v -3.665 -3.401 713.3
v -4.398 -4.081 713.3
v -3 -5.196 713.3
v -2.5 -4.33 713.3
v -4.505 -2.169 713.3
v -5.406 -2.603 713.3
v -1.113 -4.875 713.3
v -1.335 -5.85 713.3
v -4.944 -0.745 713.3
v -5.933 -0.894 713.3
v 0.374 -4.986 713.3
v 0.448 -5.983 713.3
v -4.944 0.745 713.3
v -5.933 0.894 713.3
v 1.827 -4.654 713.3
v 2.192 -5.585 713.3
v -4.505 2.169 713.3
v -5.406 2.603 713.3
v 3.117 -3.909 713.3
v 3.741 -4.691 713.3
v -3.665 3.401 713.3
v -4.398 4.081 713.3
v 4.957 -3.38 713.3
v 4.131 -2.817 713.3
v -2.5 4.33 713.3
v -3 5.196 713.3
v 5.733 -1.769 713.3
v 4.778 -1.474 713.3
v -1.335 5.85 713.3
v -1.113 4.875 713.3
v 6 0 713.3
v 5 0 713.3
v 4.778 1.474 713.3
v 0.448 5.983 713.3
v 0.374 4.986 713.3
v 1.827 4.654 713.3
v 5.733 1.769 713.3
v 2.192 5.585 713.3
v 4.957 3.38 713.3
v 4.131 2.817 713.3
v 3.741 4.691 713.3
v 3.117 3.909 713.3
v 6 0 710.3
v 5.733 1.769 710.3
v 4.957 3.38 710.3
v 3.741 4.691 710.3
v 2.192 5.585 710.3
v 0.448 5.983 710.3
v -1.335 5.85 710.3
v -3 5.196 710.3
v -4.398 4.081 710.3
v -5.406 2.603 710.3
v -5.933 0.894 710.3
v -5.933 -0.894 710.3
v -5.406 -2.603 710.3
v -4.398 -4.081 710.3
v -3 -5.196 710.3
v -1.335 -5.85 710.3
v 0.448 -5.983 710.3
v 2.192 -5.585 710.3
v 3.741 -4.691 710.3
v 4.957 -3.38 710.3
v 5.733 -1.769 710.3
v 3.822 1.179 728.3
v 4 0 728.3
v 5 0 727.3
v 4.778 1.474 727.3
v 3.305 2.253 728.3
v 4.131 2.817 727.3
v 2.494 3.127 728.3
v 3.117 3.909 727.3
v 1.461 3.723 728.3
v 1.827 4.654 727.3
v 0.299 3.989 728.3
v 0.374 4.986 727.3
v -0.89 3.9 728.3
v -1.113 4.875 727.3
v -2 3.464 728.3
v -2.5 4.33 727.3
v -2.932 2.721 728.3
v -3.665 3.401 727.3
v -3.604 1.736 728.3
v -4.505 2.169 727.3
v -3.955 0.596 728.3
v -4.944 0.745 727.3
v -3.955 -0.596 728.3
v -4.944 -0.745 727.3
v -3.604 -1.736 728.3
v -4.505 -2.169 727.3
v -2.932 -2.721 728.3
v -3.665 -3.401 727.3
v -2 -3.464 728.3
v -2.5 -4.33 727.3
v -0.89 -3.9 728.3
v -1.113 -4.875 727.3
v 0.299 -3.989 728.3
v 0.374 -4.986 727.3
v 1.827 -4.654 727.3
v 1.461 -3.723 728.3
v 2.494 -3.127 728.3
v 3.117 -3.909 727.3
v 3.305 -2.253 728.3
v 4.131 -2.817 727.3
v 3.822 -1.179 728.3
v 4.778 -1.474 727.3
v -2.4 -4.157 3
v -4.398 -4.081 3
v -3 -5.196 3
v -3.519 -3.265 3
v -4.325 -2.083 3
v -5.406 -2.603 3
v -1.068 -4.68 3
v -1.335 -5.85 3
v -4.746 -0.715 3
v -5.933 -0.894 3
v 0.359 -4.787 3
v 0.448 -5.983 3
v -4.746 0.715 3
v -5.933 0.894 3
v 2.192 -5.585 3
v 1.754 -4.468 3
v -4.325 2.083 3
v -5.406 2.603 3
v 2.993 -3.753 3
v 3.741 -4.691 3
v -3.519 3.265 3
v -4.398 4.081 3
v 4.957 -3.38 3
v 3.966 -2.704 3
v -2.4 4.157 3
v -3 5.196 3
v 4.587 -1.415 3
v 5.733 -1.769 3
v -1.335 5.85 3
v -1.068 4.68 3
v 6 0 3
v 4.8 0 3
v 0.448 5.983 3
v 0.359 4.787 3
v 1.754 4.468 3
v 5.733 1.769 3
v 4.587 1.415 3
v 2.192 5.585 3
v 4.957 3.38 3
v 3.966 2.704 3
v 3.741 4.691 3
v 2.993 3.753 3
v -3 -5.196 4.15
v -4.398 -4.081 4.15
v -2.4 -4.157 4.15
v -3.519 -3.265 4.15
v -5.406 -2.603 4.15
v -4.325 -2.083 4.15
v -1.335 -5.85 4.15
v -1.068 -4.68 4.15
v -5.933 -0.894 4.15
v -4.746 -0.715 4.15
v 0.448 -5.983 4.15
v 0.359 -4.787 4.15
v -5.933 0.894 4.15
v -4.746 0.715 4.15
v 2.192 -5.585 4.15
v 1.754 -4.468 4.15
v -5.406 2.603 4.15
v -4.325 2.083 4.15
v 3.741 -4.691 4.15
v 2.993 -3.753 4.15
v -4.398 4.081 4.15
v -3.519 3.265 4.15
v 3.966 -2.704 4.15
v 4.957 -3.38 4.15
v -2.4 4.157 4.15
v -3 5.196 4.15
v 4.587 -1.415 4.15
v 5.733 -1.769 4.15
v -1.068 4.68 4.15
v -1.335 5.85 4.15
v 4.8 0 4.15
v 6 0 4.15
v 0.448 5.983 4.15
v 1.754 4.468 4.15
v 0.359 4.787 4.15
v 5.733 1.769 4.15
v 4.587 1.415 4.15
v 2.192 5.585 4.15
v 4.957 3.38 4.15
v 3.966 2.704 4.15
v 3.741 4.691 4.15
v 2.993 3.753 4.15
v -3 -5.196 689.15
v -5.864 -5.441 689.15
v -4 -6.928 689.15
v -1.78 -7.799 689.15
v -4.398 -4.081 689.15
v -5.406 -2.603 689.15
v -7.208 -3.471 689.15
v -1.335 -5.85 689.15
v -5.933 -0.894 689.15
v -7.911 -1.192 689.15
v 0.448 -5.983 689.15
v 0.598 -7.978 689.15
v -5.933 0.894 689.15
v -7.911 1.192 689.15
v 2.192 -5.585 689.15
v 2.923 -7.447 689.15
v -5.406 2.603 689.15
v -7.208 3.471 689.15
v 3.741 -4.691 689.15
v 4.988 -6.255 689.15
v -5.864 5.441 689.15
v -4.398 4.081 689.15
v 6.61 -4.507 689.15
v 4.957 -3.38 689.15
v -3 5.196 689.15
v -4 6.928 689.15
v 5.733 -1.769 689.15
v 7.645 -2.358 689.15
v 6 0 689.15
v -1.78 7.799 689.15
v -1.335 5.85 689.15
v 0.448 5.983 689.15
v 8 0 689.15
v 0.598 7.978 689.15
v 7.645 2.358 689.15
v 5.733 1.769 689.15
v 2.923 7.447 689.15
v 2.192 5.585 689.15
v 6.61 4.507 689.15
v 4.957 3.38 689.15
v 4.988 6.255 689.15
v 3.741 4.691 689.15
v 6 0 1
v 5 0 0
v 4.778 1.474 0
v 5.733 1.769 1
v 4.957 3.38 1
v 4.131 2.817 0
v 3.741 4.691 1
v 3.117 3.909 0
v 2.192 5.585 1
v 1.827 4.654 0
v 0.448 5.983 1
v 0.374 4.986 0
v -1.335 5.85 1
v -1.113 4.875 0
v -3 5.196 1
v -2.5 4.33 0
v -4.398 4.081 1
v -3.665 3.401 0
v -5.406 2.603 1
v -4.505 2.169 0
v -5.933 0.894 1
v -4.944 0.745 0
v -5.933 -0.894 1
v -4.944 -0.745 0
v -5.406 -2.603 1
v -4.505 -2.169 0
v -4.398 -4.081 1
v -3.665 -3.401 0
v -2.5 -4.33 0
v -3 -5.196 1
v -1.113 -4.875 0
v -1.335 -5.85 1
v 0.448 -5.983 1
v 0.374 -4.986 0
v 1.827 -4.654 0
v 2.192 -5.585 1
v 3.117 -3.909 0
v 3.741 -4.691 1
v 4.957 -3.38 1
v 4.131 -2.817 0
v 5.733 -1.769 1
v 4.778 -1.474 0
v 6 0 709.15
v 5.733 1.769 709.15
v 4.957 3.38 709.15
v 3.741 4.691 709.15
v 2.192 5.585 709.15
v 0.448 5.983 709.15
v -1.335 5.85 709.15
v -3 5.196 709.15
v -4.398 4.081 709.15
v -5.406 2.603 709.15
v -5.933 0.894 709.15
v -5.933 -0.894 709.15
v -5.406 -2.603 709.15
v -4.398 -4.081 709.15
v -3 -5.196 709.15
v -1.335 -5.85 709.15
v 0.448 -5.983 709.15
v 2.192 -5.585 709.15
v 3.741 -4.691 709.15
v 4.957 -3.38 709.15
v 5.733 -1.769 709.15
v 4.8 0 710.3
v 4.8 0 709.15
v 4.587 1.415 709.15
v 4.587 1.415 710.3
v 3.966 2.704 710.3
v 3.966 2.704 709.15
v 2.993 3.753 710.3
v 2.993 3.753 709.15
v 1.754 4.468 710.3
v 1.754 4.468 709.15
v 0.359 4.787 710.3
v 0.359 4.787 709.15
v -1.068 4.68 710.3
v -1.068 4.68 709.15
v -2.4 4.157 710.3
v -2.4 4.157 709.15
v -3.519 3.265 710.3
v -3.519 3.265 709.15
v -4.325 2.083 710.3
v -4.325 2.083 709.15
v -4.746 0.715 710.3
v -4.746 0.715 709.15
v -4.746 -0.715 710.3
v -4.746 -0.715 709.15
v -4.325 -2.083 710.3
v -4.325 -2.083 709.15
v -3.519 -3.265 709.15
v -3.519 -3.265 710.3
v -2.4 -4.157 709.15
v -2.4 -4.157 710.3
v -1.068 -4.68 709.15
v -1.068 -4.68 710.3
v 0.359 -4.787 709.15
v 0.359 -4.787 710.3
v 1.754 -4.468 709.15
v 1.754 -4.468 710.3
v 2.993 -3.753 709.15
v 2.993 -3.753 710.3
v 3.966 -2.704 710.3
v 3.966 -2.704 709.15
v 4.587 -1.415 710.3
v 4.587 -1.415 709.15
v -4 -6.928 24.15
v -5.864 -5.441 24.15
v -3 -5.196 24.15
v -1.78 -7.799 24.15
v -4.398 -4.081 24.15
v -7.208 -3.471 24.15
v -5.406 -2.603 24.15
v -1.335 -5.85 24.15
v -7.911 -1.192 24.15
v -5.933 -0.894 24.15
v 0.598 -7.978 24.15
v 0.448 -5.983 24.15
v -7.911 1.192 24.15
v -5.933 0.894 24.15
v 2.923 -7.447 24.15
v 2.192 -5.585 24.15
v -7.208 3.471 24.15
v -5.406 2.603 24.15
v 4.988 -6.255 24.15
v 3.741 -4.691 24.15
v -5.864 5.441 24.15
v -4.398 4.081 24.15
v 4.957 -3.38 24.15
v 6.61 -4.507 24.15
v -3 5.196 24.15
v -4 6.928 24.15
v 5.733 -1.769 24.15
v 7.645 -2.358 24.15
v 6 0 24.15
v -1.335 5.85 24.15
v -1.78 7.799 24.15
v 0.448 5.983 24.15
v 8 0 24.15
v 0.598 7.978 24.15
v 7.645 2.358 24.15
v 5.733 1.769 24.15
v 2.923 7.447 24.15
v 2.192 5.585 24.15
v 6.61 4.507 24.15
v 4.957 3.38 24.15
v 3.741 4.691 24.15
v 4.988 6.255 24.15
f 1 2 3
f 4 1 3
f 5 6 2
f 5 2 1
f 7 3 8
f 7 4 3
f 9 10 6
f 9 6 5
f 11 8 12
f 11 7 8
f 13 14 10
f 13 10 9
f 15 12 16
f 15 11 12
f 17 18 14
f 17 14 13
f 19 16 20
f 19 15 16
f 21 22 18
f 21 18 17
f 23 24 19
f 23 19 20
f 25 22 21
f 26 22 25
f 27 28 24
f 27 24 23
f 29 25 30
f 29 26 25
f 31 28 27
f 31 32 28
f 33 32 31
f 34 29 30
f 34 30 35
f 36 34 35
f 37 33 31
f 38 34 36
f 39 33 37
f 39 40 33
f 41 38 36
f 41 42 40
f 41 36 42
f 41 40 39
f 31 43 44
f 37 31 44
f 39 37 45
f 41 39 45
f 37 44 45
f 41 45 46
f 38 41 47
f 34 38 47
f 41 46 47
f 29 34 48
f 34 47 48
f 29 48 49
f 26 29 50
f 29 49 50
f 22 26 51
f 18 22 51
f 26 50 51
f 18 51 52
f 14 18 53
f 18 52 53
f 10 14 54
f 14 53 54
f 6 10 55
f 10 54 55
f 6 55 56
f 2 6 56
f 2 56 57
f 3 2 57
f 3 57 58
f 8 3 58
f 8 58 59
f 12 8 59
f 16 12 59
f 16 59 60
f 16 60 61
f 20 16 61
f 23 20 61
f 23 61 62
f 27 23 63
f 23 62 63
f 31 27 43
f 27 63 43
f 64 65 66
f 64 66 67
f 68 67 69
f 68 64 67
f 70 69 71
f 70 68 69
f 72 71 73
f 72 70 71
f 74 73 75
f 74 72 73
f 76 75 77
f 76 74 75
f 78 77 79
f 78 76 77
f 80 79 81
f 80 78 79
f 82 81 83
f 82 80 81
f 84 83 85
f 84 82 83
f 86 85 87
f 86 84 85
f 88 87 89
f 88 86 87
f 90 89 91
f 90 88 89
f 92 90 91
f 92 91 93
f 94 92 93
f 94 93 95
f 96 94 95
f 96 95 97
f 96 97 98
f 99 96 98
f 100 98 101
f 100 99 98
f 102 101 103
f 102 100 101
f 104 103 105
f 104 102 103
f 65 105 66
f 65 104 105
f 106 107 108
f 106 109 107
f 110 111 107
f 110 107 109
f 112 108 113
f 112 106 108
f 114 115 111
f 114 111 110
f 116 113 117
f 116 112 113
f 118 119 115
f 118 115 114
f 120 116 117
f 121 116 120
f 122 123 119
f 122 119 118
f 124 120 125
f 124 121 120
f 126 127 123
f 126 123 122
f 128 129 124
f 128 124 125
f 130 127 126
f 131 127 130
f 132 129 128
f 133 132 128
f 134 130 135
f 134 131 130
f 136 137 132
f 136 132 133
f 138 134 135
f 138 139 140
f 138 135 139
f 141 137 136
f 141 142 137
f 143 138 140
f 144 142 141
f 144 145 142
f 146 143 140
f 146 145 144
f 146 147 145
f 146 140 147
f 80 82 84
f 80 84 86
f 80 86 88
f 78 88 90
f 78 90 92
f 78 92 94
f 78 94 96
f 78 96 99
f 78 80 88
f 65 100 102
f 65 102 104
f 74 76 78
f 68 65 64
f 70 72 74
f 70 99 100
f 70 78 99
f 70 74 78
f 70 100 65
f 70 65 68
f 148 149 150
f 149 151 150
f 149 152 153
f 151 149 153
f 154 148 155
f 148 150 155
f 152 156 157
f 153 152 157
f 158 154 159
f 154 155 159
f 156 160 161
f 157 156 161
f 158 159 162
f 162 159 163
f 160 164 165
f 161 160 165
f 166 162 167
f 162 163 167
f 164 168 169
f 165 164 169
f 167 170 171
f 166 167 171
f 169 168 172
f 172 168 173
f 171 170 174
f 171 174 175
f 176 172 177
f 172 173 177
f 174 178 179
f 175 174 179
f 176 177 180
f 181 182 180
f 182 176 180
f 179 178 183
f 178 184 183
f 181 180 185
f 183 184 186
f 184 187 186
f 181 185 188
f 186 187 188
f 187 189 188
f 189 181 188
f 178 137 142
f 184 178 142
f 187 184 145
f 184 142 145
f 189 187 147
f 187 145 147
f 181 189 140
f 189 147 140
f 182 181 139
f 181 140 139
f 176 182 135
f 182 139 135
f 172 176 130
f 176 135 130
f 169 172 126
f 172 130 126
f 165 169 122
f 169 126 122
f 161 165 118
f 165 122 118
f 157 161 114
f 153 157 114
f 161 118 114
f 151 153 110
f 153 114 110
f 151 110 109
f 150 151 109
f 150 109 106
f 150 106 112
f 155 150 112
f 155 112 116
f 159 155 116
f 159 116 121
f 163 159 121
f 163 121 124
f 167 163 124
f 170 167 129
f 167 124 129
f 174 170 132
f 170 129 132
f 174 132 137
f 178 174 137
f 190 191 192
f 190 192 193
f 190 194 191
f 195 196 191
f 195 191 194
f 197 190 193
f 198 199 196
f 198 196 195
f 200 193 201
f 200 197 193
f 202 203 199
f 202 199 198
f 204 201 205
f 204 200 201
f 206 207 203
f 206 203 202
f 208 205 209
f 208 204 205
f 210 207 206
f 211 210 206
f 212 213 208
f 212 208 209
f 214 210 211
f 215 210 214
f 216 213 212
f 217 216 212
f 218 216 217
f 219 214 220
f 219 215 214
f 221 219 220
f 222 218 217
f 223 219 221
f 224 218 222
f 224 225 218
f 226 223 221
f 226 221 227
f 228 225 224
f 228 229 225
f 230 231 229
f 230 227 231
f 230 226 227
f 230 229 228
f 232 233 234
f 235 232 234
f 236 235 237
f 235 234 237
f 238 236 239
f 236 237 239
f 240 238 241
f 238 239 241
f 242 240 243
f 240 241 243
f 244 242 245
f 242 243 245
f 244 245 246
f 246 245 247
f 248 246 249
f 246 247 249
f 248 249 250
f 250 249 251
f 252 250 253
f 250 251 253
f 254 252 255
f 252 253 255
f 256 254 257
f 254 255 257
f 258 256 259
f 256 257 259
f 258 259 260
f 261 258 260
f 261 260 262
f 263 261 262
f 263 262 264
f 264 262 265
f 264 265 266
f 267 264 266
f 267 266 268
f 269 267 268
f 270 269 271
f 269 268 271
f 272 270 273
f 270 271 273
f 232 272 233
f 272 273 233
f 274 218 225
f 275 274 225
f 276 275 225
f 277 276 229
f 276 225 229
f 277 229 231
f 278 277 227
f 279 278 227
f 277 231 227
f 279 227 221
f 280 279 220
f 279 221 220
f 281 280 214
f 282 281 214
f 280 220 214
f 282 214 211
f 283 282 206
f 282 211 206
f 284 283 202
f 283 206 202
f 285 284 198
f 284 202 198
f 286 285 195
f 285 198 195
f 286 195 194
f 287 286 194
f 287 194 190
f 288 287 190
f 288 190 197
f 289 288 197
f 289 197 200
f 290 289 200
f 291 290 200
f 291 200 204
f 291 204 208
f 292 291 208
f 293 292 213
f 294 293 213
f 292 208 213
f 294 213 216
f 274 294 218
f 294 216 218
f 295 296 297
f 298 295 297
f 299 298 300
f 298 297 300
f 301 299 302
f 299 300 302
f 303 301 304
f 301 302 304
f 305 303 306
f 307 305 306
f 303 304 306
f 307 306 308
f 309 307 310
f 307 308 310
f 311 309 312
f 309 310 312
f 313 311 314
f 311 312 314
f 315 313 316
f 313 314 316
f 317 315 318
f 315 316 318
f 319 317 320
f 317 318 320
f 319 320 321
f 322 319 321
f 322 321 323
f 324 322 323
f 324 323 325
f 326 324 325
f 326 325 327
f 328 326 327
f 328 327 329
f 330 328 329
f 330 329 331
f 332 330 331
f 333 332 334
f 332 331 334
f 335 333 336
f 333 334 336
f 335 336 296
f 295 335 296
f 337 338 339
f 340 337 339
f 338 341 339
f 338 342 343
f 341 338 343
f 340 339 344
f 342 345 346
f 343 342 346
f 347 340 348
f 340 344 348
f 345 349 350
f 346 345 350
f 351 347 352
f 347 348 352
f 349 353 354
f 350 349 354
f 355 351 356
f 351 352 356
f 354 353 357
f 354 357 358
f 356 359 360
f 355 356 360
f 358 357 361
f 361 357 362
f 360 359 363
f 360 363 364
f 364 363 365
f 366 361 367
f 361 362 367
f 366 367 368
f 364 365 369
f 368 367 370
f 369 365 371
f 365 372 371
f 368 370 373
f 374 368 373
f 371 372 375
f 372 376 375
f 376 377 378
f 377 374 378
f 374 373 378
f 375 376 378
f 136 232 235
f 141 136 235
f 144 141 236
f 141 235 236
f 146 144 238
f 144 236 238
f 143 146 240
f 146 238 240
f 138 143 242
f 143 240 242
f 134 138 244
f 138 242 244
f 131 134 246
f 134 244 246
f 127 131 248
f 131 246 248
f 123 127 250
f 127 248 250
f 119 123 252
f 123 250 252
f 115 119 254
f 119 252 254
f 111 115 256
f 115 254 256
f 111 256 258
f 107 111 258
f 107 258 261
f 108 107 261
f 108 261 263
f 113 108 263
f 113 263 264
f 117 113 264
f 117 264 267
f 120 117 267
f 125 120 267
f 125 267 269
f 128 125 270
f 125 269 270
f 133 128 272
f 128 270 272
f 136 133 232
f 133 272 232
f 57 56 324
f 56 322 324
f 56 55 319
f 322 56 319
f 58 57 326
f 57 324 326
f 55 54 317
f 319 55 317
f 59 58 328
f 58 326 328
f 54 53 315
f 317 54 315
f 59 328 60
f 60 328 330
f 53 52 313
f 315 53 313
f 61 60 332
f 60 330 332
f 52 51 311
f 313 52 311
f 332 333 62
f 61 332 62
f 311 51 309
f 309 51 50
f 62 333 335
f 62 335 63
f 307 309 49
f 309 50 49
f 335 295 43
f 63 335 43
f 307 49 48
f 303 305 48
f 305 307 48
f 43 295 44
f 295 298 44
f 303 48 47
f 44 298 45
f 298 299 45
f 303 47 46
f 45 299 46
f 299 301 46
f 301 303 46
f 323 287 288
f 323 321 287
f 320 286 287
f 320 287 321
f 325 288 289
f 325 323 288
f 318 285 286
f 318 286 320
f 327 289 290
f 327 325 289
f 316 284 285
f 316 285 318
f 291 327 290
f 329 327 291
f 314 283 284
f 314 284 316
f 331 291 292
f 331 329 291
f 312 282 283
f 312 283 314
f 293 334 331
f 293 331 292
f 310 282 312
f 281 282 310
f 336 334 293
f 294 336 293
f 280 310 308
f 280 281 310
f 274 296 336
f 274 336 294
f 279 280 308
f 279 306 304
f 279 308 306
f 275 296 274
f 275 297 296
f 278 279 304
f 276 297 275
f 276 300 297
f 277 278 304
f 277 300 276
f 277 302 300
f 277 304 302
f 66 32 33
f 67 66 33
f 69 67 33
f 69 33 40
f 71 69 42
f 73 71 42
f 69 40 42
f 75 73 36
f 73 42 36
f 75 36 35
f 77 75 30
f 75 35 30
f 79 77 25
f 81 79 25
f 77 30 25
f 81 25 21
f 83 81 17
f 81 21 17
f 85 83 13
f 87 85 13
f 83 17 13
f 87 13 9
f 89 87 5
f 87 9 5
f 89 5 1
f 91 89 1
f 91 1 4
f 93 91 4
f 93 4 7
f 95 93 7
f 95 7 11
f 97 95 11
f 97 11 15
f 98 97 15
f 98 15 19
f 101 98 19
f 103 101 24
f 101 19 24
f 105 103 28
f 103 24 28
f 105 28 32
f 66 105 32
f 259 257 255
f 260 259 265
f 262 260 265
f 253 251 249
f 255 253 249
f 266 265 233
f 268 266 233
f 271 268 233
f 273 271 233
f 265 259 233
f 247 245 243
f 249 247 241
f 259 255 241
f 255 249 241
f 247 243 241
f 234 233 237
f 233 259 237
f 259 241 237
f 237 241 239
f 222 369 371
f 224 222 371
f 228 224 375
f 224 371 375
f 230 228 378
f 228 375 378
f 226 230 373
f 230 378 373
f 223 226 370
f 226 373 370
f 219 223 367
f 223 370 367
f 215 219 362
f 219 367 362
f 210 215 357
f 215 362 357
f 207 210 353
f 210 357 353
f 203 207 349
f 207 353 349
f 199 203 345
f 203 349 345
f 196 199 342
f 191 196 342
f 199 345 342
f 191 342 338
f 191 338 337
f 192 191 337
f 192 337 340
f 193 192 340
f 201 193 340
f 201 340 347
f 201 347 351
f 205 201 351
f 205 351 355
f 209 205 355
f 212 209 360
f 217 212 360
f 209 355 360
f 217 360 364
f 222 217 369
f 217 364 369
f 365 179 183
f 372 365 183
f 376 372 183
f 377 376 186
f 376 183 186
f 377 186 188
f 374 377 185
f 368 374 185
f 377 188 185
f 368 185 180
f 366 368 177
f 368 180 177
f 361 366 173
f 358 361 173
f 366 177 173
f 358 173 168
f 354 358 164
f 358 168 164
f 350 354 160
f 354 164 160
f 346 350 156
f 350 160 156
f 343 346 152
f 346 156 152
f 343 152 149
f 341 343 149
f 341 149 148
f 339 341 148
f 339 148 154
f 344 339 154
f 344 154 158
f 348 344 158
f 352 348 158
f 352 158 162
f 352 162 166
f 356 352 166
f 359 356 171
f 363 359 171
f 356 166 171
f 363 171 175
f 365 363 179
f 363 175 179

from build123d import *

# Parameters (mm, degrees)
F0_R      = 6
F1_DEPTH  = 3
F2_R      = 4.8
F3_DEPTH  = 1.15
F4_R      = 6
F4_R_2    = 4.8
F5_DEPTH  = 20
F6_R      = 8
F6_R_2    = 6
F7_DEPTH  = 665
F8_R      = 6
F9_DEPTH  = 20
F10_R     = 4.8
F11_DEPTH = 1.15
F12_R     = 6
F12_R_2   = 4.8
F13_DEPTH = 3
F14_R     = 5
F15_DEPTH = 15
F16_SIZE  = 1


with BuildPart() as f1:
    # F0 (on Top) → F1 (new body)
    with BuildSketch(Plane.XY):
        Circle(F0_R)
    extrude(amount=F1_DEPTH)

    # F2 (on face) → F3 (join)
    with BuildSketch(Plane.XY.offset(3)):
        Circle(F2_R)
    extrude(amount=F3_DEPTH)

    # F4 (on face) → F5 (join)
    with BuildSketch(Plane.XY.offset(4.15)):
        Circle(F4_R)
        Circle(F4_R_2, mode=Mode.SUBTRACT)
        Circle(F4_R_2)
    extrude(amount=F5_DEPTH)

    # F6 (on face) → F7 (join)
    with BuildSketch(Plane.XY.offset(24.15)):
        Circle(F6_R)
        Circle(F6_R_2, mode=Mode.SUBTRACT)
        Circle(F6_R_2)
    extrude(amount=F7_DEPTH)

    # F8 (on face) → F9 (join)
    with BuildSketch(Plane.XY.offset(689.15)):
        Circle(F8_R)
    extrude(amount=F9_DEPTH)

    # F10 (on face) → F11 (join)
    with BuildSketch(Plane.XY.offset(709.15)):
        Circle(F10_R)
    extrude(amount=F11_DEPTH)

    # F12 (on face) → F13 (join)
    with BuildSketch(Plane.XY.offset(710.3)):
        Circle(F12_R)
        Circle(F12_R_2, mode=Mode.SUBTRACT)
        Circle(F12_R_2)
    extrude(amount=F13_DEPTH)

    # F14 (on face) → F15 (join)
    with BuildSketch(Plane.XY.offset(713.3)):
        Circle(F14_R)
    extrude(amount=F15_DEPTH)

    # F16
    f16_edges = [f1.edges().sort_by_distance(p)[0] for p in [
        (-5, 0, 728.3),
        (-6, 0, 0),
    ]]
    chamfer(f16_edges, length=F16_SIZE)


solid = f1.part
